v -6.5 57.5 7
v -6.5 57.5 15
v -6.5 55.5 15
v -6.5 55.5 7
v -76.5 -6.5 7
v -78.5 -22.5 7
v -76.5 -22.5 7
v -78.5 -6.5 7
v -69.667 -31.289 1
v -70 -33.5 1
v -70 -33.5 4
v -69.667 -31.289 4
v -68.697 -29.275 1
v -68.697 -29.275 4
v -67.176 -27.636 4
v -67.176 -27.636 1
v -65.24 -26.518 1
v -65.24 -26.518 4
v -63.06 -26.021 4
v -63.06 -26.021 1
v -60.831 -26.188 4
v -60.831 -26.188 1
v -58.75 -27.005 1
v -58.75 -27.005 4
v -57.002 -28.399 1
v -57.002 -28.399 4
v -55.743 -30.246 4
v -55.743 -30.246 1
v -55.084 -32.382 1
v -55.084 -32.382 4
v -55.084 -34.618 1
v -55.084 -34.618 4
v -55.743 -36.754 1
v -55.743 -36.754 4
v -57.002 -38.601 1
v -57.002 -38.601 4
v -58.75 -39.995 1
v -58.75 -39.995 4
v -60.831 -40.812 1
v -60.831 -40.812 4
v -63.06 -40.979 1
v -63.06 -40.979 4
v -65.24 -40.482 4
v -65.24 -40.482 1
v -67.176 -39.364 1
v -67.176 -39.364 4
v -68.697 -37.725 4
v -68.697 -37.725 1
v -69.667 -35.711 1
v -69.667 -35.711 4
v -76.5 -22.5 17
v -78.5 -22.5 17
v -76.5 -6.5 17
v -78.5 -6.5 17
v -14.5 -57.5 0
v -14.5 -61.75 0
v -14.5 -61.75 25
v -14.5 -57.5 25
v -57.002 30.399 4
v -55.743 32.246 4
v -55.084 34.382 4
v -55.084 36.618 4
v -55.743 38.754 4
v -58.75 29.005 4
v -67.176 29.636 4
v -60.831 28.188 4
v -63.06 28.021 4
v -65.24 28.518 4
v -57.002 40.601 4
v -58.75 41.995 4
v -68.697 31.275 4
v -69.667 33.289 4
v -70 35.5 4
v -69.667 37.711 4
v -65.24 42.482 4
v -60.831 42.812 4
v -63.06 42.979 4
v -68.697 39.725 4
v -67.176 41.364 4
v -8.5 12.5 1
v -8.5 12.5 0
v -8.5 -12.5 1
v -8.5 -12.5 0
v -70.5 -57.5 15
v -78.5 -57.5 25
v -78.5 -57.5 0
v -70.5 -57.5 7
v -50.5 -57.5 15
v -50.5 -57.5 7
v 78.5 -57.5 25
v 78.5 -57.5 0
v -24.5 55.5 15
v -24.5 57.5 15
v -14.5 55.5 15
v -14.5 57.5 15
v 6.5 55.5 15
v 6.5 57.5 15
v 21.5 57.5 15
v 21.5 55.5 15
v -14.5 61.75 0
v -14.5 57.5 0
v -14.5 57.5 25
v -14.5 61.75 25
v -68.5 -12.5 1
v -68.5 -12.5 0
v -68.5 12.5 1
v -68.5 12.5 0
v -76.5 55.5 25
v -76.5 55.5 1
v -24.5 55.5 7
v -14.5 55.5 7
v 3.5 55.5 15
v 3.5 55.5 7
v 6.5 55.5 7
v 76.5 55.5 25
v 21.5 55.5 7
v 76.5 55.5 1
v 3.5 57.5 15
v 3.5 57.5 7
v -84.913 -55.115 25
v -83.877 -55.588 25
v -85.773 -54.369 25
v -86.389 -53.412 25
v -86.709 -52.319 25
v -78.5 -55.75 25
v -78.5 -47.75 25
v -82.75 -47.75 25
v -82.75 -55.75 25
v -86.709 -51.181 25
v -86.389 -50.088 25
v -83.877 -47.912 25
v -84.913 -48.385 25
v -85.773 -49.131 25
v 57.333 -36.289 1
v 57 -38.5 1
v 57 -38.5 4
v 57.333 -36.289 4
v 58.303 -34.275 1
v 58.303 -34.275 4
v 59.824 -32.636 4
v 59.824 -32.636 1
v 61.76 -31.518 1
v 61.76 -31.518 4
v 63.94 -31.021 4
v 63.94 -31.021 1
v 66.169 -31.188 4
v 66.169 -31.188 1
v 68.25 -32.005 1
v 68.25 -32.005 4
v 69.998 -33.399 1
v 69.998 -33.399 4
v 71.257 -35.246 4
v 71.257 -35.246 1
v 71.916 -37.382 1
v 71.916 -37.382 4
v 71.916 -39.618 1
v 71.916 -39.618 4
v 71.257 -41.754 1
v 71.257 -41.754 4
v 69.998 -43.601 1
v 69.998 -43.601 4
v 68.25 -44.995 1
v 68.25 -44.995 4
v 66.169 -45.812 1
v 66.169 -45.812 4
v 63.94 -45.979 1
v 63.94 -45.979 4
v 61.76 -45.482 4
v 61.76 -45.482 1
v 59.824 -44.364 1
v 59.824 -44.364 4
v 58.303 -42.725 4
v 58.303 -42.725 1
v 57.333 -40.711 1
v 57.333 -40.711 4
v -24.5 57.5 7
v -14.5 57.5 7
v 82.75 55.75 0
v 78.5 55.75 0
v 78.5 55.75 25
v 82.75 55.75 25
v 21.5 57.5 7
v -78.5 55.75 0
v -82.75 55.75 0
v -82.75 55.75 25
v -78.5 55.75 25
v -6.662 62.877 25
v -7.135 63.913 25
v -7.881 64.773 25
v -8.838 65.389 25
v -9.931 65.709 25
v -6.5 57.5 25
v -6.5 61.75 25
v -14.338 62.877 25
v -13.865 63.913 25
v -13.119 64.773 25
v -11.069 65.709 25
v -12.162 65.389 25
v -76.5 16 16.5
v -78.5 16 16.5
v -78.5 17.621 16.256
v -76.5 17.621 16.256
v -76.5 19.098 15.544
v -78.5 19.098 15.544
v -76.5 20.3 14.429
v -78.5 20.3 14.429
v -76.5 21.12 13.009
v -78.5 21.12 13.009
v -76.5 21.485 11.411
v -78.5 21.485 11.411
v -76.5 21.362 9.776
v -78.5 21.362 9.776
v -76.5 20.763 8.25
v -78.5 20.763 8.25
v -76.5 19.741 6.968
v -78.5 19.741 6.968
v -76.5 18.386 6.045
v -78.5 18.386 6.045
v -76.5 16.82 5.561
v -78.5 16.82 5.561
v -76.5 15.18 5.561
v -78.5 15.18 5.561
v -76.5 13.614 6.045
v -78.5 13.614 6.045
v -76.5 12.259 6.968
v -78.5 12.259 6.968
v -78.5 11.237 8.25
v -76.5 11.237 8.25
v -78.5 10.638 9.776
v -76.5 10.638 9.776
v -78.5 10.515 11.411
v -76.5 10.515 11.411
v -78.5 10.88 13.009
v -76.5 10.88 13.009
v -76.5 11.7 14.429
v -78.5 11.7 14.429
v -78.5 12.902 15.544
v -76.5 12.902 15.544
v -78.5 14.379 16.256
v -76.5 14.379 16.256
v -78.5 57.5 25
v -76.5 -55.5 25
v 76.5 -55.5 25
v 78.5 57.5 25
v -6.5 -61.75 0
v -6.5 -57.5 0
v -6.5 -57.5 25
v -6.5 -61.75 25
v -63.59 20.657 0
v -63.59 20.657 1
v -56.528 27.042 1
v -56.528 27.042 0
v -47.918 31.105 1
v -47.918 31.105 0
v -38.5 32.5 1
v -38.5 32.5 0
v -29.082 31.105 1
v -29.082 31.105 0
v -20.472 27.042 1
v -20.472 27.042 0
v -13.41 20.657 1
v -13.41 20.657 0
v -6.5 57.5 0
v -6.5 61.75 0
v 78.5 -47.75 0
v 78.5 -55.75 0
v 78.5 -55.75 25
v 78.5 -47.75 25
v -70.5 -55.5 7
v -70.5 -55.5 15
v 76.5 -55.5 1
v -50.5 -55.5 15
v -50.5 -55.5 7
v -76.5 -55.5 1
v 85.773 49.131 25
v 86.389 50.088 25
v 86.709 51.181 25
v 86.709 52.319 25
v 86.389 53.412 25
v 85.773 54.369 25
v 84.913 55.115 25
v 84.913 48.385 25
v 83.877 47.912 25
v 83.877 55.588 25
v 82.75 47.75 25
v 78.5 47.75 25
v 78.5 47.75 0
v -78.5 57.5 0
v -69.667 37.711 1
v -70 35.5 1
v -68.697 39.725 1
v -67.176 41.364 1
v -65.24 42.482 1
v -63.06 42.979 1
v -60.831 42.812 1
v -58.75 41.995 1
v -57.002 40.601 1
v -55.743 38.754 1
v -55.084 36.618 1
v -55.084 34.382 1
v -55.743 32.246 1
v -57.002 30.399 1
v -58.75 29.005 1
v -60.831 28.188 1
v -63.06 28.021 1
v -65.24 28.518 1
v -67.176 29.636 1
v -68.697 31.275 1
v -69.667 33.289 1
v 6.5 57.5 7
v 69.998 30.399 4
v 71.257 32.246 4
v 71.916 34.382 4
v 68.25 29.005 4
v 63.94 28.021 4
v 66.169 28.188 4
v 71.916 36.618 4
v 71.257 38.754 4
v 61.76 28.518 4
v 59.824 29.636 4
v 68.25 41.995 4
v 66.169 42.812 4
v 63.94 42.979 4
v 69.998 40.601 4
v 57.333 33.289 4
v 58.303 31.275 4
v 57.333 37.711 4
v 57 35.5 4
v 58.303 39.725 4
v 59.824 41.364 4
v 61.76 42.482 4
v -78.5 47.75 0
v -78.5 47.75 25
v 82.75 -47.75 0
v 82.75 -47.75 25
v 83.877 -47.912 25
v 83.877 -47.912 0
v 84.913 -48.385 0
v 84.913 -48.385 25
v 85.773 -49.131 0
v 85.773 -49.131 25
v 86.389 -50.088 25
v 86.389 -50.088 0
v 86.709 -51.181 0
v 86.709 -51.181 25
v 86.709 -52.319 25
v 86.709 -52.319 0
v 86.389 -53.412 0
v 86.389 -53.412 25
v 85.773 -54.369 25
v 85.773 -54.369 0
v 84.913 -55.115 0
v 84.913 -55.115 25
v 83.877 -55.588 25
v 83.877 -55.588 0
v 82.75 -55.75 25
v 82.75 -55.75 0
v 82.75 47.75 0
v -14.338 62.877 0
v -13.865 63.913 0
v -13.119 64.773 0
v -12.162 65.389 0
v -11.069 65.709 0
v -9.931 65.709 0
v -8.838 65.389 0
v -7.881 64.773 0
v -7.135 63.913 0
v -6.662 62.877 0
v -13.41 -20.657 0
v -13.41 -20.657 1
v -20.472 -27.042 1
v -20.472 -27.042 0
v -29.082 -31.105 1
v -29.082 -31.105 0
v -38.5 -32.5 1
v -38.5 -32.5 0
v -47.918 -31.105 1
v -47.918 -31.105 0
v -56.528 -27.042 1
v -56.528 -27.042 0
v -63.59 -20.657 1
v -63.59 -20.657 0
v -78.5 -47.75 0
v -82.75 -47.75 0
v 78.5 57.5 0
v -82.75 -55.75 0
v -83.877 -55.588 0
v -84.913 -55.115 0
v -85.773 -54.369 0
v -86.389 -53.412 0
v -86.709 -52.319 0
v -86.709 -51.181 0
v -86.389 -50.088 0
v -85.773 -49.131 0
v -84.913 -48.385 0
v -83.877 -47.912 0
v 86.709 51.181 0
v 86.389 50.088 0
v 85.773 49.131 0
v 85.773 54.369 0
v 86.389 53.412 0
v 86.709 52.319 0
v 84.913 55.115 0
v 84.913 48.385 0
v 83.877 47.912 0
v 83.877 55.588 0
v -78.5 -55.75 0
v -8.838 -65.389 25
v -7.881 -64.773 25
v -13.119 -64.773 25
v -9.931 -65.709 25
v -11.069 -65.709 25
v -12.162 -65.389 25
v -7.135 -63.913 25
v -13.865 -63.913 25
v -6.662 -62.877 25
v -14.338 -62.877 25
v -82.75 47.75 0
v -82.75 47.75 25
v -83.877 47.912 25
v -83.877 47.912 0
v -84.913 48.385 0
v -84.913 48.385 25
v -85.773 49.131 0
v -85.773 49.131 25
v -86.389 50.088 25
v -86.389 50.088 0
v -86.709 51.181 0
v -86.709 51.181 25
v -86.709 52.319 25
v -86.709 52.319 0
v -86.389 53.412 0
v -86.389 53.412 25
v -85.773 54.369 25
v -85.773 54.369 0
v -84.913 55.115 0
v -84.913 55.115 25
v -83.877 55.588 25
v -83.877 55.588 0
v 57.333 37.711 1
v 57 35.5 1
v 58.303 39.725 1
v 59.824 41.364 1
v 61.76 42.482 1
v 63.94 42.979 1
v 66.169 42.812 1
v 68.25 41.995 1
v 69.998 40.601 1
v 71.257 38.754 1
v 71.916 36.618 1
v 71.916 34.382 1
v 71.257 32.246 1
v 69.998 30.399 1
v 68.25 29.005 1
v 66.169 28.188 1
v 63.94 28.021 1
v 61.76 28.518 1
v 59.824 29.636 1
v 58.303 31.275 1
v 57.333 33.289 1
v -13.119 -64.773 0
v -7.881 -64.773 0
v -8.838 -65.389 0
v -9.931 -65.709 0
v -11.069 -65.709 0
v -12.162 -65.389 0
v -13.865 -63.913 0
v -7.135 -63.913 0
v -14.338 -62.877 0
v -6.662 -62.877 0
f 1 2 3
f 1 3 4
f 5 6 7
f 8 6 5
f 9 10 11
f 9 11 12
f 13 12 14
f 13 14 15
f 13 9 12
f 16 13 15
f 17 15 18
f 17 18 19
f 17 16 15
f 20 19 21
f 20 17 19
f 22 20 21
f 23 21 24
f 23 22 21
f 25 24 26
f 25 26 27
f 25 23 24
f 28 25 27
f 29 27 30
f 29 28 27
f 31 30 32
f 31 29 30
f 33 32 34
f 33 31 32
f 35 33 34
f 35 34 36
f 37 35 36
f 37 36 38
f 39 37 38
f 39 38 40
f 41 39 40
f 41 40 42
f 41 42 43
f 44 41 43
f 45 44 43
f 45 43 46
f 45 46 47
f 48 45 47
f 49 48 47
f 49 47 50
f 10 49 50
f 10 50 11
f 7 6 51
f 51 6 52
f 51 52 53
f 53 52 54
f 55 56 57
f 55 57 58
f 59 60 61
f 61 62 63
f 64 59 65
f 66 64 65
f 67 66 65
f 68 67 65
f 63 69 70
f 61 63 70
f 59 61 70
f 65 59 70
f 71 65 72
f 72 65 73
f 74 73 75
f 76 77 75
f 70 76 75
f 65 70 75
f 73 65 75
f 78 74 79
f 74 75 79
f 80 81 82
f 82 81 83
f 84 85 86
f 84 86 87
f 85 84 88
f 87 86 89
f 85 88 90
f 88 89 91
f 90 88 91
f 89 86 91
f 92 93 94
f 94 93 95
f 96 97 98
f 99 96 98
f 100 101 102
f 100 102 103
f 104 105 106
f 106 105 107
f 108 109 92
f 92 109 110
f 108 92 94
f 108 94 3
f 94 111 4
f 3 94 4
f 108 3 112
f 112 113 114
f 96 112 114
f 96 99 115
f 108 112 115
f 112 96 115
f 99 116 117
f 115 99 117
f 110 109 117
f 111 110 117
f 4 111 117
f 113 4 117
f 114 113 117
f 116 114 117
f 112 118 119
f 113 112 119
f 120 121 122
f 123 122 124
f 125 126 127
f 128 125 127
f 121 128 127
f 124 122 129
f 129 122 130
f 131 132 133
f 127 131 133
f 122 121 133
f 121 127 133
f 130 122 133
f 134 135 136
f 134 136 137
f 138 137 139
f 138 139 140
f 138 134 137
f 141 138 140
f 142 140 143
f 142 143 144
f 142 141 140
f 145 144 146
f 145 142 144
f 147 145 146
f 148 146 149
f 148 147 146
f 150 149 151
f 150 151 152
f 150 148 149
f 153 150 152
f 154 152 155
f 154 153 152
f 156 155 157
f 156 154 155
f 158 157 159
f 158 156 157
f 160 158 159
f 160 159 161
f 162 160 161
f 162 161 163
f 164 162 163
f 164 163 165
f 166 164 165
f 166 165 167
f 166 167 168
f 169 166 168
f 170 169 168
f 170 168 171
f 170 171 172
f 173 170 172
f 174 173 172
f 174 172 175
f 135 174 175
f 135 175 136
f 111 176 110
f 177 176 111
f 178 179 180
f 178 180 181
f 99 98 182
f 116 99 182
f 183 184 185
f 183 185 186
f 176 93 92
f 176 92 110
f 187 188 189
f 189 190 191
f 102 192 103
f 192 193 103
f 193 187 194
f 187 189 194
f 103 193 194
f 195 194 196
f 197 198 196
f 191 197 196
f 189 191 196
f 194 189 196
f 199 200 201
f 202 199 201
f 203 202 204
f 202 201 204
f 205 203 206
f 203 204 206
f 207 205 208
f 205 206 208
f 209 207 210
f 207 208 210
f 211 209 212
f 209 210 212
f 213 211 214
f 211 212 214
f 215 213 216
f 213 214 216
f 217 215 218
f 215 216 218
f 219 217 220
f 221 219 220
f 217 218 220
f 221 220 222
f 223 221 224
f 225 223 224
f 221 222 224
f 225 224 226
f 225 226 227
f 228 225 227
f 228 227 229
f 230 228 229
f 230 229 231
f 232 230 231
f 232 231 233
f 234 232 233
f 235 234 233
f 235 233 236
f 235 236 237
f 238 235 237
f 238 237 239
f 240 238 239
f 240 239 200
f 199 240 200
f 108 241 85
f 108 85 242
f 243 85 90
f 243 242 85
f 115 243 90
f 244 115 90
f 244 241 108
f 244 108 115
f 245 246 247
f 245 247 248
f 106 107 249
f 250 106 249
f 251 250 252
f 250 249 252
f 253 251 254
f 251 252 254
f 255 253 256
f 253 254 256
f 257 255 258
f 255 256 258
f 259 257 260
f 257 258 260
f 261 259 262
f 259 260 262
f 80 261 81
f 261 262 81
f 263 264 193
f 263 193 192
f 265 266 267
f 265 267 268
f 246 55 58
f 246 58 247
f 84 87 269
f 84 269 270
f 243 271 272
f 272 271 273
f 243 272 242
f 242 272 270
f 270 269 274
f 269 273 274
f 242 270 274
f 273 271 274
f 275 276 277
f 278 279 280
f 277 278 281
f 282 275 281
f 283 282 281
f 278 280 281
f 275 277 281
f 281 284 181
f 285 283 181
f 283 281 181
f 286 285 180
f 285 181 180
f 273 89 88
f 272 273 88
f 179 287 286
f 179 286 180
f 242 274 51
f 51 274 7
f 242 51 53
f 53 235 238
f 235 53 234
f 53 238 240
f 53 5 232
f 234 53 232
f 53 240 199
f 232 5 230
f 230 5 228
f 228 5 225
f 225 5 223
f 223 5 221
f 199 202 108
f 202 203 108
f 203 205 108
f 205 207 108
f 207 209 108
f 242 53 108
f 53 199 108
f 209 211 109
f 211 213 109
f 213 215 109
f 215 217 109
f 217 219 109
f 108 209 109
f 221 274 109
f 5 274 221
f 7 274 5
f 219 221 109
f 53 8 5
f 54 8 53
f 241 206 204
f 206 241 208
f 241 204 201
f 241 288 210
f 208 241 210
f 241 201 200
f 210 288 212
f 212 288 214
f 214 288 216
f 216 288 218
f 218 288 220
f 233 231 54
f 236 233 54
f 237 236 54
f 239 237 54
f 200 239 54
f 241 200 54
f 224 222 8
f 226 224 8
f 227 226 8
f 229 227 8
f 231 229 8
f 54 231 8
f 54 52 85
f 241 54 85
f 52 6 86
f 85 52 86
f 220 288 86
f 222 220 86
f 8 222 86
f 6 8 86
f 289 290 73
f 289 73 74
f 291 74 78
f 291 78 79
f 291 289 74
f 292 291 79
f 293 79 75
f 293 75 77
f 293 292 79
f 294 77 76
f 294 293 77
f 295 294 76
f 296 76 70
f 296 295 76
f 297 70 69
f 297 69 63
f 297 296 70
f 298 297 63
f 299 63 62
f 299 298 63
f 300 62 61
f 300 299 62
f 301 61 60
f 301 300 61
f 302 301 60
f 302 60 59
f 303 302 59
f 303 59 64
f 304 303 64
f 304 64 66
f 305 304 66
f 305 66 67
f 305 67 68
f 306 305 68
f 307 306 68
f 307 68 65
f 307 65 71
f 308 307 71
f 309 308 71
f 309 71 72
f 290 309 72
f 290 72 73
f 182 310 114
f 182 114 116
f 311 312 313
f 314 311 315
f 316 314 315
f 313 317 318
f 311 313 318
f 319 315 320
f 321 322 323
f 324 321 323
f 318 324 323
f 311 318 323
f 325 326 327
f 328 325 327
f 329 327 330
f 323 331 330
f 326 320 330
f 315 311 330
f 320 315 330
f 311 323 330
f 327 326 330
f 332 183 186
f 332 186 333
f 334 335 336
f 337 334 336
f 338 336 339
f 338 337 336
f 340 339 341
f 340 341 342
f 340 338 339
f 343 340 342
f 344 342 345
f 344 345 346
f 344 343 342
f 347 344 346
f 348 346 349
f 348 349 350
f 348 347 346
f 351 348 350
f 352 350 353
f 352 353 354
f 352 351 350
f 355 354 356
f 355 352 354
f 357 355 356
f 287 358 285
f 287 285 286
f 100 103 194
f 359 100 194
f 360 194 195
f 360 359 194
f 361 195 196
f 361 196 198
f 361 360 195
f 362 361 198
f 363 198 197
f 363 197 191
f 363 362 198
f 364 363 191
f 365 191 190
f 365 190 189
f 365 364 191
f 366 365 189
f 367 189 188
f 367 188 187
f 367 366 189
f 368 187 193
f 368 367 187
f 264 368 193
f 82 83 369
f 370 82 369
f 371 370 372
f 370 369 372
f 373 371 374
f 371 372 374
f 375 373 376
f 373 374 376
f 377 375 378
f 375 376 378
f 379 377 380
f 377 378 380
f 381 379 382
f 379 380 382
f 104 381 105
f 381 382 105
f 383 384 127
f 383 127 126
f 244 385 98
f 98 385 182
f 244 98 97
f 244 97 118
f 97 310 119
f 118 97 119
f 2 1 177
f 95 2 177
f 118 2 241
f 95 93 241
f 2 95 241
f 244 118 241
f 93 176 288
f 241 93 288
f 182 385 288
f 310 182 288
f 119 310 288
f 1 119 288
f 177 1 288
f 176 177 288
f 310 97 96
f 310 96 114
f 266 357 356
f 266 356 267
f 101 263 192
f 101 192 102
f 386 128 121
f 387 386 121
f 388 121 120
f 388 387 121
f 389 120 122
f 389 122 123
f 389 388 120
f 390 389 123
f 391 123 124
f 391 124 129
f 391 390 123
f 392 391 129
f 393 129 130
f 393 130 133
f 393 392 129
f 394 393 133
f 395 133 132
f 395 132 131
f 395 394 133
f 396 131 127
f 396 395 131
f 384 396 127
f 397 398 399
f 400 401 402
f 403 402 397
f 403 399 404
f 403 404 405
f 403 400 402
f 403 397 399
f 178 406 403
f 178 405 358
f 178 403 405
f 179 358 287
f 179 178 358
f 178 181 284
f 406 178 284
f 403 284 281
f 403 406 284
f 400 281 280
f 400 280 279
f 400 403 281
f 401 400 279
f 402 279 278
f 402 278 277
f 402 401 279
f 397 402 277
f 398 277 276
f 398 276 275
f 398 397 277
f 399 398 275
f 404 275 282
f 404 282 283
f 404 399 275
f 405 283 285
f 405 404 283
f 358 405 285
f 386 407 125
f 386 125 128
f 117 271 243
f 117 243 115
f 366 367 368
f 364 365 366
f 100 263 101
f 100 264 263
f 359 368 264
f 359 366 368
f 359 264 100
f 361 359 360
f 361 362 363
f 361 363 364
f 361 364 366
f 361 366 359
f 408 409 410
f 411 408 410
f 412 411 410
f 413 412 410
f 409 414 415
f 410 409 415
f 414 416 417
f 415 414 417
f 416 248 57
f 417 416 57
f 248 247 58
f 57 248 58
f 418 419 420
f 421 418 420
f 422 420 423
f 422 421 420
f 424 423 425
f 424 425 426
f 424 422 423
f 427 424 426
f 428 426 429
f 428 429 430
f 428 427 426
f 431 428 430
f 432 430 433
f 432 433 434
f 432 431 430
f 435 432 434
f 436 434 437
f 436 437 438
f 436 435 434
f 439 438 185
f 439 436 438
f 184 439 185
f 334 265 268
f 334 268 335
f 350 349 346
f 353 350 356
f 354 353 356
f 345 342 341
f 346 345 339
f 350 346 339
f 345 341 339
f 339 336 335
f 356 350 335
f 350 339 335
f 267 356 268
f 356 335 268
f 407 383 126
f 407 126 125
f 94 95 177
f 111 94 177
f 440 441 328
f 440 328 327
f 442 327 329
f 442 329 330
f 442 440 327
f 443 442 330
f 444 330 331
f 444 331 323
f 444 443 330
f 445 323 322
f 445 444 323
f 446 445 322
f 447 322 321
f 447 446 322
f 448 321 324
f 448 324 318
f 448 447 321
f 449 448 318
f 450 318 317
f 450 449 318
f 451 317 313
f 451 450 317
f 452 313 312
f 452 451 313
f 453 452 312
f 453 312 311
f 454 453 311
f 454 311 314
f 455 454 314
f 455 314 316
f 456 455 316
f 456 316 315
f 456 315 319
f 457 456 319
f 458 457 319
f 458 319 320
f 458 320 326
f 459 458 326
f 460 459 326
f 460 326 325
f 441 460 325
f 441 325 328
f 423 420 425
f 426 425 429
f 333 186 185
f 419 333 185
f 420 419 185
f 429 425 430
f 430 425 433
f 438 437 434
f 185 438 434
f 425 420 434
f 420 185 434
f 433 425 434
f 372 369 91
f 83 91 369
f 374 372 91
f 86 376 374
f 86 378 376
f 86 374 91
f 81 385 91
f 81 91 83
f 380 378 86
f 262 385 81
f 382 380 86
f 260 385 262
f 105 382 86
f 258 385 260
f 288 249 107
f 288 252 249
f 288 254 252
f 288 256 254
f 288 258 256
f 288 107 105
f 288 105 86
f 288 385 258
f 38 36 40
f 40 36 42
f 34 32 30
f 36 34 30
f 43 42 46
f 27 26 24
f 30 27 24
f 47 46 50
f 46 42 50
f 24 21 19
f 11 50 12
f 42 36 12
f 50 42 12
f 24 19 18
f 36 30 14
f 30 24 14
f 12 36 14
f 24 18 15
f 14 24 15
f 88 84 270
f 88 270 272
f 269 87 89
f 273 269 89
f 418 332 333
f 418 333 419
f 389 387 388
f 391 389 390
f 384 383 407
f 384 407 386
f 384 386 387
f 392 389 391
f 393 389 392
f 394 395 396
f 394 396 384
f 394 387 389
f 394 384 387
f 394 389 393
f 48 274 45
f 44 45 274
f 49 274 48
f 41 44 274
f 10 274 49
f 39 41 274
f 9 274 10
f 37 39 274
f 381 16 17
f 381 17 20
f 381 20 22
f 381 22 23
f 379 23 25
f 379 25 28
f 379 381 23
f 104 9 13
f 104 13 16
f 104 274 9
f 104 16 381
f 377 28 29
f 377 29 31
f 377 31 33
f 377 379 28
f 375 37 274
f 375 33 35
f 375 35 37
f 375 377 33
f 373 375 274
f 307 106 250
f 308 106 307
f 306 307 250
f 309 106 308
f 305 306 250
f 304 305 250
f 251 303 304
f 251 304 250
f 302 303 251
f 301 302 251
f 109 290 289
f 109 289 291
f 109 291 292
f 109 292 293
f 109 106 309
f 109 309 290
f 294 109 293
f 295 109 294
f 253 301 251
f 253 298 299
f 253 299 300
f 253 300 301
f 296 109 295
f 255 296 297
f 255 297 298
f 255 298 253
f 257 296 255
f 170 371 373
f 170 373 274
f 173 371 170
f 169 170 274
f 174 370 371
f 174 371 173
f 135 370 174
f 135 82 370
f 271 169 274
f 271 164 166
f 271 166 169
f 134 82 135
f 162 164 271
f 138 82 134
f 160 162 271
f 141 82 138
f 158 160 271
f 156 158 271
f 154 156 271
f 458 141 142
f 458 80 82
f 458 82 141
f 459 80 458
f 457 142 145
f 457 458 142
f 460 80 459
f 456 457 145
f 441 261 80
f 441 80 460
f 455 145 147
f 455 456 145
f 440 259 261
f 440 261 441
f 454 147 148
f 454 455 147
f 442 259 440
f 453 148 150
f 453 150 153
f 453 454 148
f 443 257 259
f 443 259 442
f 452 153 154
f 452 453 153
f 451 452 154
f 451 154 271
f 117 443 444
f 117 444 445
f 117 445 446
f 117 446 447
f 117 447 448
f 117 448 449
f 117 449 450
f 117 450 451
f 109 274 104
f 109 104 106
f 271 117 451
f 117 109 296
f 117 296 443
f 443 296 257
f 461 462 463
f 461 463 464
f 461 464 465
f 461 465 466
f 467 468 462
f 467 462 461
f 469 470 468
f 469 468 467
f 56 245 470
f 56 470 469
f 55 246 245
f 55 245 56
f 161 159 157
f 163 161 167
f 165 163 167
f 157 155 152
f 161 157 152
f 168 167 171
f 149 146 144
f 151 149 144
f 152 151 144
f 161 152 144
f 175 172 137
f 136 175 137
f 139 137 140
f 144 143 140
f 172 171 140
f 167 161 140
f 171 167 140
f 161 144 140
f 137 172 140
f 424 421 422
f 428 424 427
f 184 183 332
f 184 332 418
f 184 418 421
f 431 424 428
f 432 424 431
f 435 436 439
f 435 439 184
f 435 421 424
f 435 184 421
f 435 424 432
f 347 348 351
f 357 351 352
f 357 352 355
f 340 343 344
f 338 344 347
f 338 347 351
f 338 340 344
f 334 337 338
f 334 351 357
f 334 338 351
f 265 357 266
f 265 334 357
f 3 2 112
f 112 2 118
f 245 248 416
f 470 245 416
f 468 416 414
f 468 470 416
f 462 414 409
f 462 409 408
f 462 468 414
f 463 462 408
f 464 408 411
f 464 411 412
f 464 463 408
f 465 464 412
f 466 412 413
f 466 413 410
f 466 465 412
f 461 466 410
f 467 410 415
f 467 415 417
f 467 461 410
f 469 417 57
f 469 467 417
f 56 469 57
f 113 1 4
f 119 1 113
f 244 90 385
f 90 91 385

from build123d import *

# Parameters (mm, degrees)
SKETCH1_W             = 157
SKETCH1_H             = 115
BOSS_EXTRUDE1_DEPTH   = 1
SKETCH2_W             = 2
SKETCH2_H             = 111
BOSS_EXTRUDE2_DEPTH   = 24
CUT_EXTRUDE1_REACH    = 159
SKETCH4_R             = 5.5
SKETCH4_W             = 10
SKETCH4_H             = 16
CUT_EXTRUDE2_REACH    = 117
SKETCH5_W             = 20
SKETCH5_H             = 8
CUT_EXTRUDE3_REACH    = 117
SKETCH6_W             = 10
SKETCH6_H             = 8
SKETCH6_W_2           = 15
SKETCH8_R             = 7.5
BOSS_EXTRUDE3_DEPTH   = 4
CUT_EXTRUDE5_REACH    = 27
BOSS_EXTRUDE5_DEPTH   = 25
BOSS_EXTRUDE5_2_DEPTH = 25
BOSS_EXTRUDE5_3_DEPTH = 25
BOSS_EXTRUDE5_4_DEPTH = 25
BOSS_EXTRUDE5_5_DEPTH = 25
BOSS_EXTRUDE5_6_DEPTH = 25


with BuildPart() as part:
    # Sketch1 → Boss-Extrude1 (new body)
    with BuildSketch(Plane.XY):
        Rectangle(SKETCH1_W, SKETCH1_H)
    extrude(amount=BOSS_EXTRUDE1_DEPTH)

    # Sketch2 → Boss-Extrude2 (add)
    with BuildSketch(Plane.XY.offset(1)):
        with Locations((-77.5, 0)):
            Rectangle(SKETCH2_W, SKETCH2_H)
        Polygon((78.5, 57.5), (-78.5, 57.5), (-78.5, 55.5), (-76.5, 55.5), (76.5, 55.5), (78.5, 55.5), align=None)
        with Locations((77.5, 0)):
            Rectangle(SKETCH2_W, SKETCH2_H)
        Polygon((-76.5, -55.5), (-78.5, -55.5), (-78.5, -57.5), (78.5, -57.5), (78.5, -55.5), (76.5, -55.5), align=None)
    extrude(amount=BOSS_EXTRUDE2_DEPTH)

    # Sketch4 → Cut-Extrude1 (cut, up to next)
    with BuildSketch(Plane.ZY.offset(78.5), mode=Mode.PRIVATE) as cut_extrude1_sk1:
        with Locations((11, 16)):
            Circle(SKETCH4_R)
    cut_extrude1_tool1 = extrude(cut_extrude1_sk1.sketch, amount=-CUT_EXTRUDE1_REACH, mode=Mode.PRIVATE) & part.part
    add(cut_extrude1_tool1.solids().sort_by_distance((-78.5, 16, 11))[0], mode=Mode.SUBTRACT)
    # Sketch4 → Cut-Extrude1 (cut, up to next)
    with BuildSketch(Plane.ZY.offset(78.5), mode=Mode.PRIVATE) as cut_extrude1_sk2:
        with Locations((12, -14.5)):
            Rectangle(SKETCH4_W, SKETCH4_H)
    cut_extrude1_tool2 = extrude(cut_extrude1_sk2.sketch, amount=-CUT_EXTRUDE1_REACH, mode=Mode.PRIVATE) & part.part
    add(cut_extrude1_tool2.solids().sort_by_distance((-78.5, -14.5, 12))[0], mode=Mode.SUBTRACT)

    # Sketch5 → Cut-Extrude2 (cut, up to next)
    with BuildSketch(Plane.XZ.offset(57.5), mode=Mode.PRIVATE) as cut_extrude2_sk1:
        with Locations((-60.5, 11)):
            Rectangle(SKETCH5_W, SKETCH5_H)
    cut_extrude2_tool1 = extrude(cut_extrude2_sk1.sketch, amount=-CUT_EXTRUDE2_REACH, mode=Mode.PRIVATE) & part.part
    add(cut_extrude2_tool1.solids().sort_by_distance((-60.5, -57.5, 11))[0], mode=Mode.SUBTRACT)

    # Sketch6 → Cut-Extrude3 (cut, up to next)
    with BuildSketch(Plane(origin=(0, 57.5, 0), x_dir=(1, 0, 0), z_dir=(0, 1, 0)), mode=Mode.PRIVATE) as cut_extrude3_sk1:
        with Locations((-19.5, -11)):
            Rectangle(SKETCH6_W, SKETCH6_H)
    cut_extrude3_tool1 = extrude(cut_extrude3_sk1.sketch, amount=-CUT_EXTRUDE3_REACH, mode=Mode.PRIVATE) & part.part
    add(cut_extrude3_tool1.solids().sort_by_distance((-19.5, 57.5, 11))[0], mode=Mode.SUBTRACT)
    # Sketch6 → Cut-Extrude3 (cut, up to next)
    with BuildSketch(Plane(origin=(0, 57.5, 0), x_dir=(1, 0, 0), z_dir=(0, 1, 0)), mode=Mode.PRIVATE) as cut_extrude3_sk2:
        with Locations((-1.5, -11)):
            Rectangle(SKETCH6_W, SKETCH6_H)
    cut_extrude3_tool2 = extrude(cut_extrude3_sk2.sketch, amount=-CUT_EXTRUDE3_REACH, mode=Mode.PRIVATE) & part.part
    add(cut_extrude3_tool2.solids().sort_by_distance((-1.5, 57.5, 11))[0], mode=Mode.SUBTRACT)
    # Sketch6 → Cut-Extrude3 (cut, up to next)
    with BuildSketch(Plane(origin=(0, 57.5, 0), x_dir=(1, 0, 0), z_dir=(0, 1, 0)), mode=Mode.PRIVATE) as cut_extrude3_sk3:
        with Locations((14, -11)):
            Rectangle(SKETCH6_W_2, SKETCH6_H)
    cut_extrude3_tool3 = extrude(cut_extrude3_sk3.sketch, amount=-CUT_EXTRUDE3_REACH, mode=Mode.PRIVATE) & part.part
    add(cut_extrude3_tool3.solids().sort_by_distance((14, 57.5, 11))[0], mode=Mode.SUBTRACT)

    # Sketch8 → Boss-Extrude3 (add)
    with BuildSketch(Plane(origin=(0, 0, 0), x_dir=(-1, 0, 0), z_dir=(0, 0, -1))):
        with Locations((-64.5, 35.5)):
            Circle(SKETCH8_R)
        with Locations((62.5, 35.5)):
            Circle(SKETCH8_R)
        with Locations((62.5, -33.5)):
            Circle(SKETCH8_R)
        with Locations((-64.5, -38.5)):
            Circle(SKETCH8_R)
    extrude(amount=-BOSS_EXTRUDE3_DEPTH)

    # Sketch9 → Cut-Extrude5 (cut, up to next)
    with BuildSketch(Plane(origin=(0, 0, 0), x_dir=(-1, 0, 0), z_dir=(0, 0, -1)), mode=Mode.PRIVATE) as cut_extrude5_sk1:
        with BuildLine():
            Line((8.5, 12.5), (8.5, -12.5))
            ThreePointArc((8.5, -12.5), (38.5, -32.5), (68.5, -12.5))
            Line((68.5, -12.5), (68.5, 12.5))
            ThreePointArc((68.5, 12.5), (38.5, 32.5), (8.5, 12.5))
        make_face()
    cut_extrude5_tool1 = extrude(cut_extrude5_sk1.sketch, amount=-CUT_EXTRUDE5_REACH, mode=Mode.PRIVATE) & part.part
    add(cut_extrude5_tool1.solids().sort_by_distance((-38.5, 0, 0))[0], mode=Mode.SUBTRACT)


with BuildPart() as body_2:
    # Sketch13 → Boss-Extrude5 (new body)
    with BuildSketch(Plane(origin=(0, 0, 0), x_dir=(-1, 0, 0), z_dir=(0, 0, -1))):
        with BuildLine():
            Line((-82.75, -55.75), (-78.5, -55.75))
            Line((-78.5, -55.75), (-78.5, -47.75))
            Line((-78.5, -47.75), (-82.75, -47.75))
            ThreePointArc((-82.75, -47.75), (-86.75, -51.75), (-82.75, -55.75))
        make_face()
    extrude(amount=-BOSS_EXTRUDE5_DEPTH)


with BuildPart() as body_3:
    # Sketch13 → Boss-Extrude5 2 (new body)
    with BuildSketch(Plane(origin=(0, 0, 0), x_dir=(-1, 0, 0), z_dir=(0, 0, -1))):
        with BuildLine():
            Line((-78.5, 47.75), (-78.5, 55.75))
            Line((-78.5, 55.75), (-82.75, 55.75))
            ThreePointArc((-82.75, 55.75), (-86.75, 51.75), (-82.75, 47.75))
            Line((-82.75, 47.75), (-78.5, 47.75))
        make_face()
    extrude(amount=-BOSS_EXTRUDE5_2_DEPTH)


with BuildPart() as body_4:
    # Sketch13 → Boss-Extrude5 3 (new body)
    with BuildSketch(Plane(origin=(0, 0, 0), x_dir=(-1, 0, 0), z_dir=(0, 0, -1))):
        with BuildLine():
            Line((78.5, -47.75), (78.5, -55.75))
            Line((78.5, -55.75), (82.75, -55.75))
            ThreePointArc((82.75, -55.75), (86.75, -51.75), (82.75, -47.75))
            Line((82.75, -47.75), (78.5, -47.75))
        make_face()
    extrude(amount=-BOSS_EXTRUDE5_3_DEPTH)


with BuildPart() as body_5:
    # Sketch13 → Boss-Extrude5 4 (new body)
    with BuildSketch(Plane(origin=(0, 0, 0), x_dir=(-1, 0, 0), z_dir=(0, 0, -1))):
        with BuildLine():
            Line((82.75, 55.75), (78.5, 55.75))
            Line((78.5, 55.75), (78.5, 47.75))
            Line((78.5, 47.75), (82.75, 47.75))
            ThreePointArc((82.75, 47.75), (86.75, 51.75), (82.75, 55.75))
        make_face()
    extrude(amount=-BOSS_EXTRUDE5_4_DEPTH)


with BuildPart() as body_6:
    # Sketch13 → Boss-Extrude5 5 (new body)
    with BuildSketch(Plane(origin=(0, 0, 0), x_dir=(-1, 0, 0), z_dir=(0, 0, -1))):
        with BuildLine():
            Line((6.5, 57.5), (14.5, 57.5))
            Line((14.5, 57.5), (14.5, 61.75))
            ThreePointArc((14.5, 61.75), (10.5, 65.75), (6.5, 61.75))
            Line((6.5, 61.75), (6.5, 57.5))
        make_face()
    extrude(amount=-BOSS_EXTRUDE5_5_DEPTH)


with BuildPart() as body_7:
    # Sketch13 → Boss-Extrude5 6 (new body)
    with BuildSketch(Plane(origin=(0, 0, 0), x_dir=(-1, 0, 0), z_dir=(0, 0, -1))):
        with BuildLine():
            Line((14.5, -61.75), (14.5, -57.5))
            Line((14.5, -57.5), (6.5, -57.5))
            Line((6.5, -57.5), (6.5, -61.75))
            ThreePointArc((6.5, -61.75), (10.5, -65.75), (14.5, -61.75))
        make_face()
    extrude(amount=-BOSS_EXTRUDE5_6_DEPTH)


solid = Compound([part.part, body_2.part, body_3.part, body_4.part, body_5.part, body_6.part, body_7.part])
